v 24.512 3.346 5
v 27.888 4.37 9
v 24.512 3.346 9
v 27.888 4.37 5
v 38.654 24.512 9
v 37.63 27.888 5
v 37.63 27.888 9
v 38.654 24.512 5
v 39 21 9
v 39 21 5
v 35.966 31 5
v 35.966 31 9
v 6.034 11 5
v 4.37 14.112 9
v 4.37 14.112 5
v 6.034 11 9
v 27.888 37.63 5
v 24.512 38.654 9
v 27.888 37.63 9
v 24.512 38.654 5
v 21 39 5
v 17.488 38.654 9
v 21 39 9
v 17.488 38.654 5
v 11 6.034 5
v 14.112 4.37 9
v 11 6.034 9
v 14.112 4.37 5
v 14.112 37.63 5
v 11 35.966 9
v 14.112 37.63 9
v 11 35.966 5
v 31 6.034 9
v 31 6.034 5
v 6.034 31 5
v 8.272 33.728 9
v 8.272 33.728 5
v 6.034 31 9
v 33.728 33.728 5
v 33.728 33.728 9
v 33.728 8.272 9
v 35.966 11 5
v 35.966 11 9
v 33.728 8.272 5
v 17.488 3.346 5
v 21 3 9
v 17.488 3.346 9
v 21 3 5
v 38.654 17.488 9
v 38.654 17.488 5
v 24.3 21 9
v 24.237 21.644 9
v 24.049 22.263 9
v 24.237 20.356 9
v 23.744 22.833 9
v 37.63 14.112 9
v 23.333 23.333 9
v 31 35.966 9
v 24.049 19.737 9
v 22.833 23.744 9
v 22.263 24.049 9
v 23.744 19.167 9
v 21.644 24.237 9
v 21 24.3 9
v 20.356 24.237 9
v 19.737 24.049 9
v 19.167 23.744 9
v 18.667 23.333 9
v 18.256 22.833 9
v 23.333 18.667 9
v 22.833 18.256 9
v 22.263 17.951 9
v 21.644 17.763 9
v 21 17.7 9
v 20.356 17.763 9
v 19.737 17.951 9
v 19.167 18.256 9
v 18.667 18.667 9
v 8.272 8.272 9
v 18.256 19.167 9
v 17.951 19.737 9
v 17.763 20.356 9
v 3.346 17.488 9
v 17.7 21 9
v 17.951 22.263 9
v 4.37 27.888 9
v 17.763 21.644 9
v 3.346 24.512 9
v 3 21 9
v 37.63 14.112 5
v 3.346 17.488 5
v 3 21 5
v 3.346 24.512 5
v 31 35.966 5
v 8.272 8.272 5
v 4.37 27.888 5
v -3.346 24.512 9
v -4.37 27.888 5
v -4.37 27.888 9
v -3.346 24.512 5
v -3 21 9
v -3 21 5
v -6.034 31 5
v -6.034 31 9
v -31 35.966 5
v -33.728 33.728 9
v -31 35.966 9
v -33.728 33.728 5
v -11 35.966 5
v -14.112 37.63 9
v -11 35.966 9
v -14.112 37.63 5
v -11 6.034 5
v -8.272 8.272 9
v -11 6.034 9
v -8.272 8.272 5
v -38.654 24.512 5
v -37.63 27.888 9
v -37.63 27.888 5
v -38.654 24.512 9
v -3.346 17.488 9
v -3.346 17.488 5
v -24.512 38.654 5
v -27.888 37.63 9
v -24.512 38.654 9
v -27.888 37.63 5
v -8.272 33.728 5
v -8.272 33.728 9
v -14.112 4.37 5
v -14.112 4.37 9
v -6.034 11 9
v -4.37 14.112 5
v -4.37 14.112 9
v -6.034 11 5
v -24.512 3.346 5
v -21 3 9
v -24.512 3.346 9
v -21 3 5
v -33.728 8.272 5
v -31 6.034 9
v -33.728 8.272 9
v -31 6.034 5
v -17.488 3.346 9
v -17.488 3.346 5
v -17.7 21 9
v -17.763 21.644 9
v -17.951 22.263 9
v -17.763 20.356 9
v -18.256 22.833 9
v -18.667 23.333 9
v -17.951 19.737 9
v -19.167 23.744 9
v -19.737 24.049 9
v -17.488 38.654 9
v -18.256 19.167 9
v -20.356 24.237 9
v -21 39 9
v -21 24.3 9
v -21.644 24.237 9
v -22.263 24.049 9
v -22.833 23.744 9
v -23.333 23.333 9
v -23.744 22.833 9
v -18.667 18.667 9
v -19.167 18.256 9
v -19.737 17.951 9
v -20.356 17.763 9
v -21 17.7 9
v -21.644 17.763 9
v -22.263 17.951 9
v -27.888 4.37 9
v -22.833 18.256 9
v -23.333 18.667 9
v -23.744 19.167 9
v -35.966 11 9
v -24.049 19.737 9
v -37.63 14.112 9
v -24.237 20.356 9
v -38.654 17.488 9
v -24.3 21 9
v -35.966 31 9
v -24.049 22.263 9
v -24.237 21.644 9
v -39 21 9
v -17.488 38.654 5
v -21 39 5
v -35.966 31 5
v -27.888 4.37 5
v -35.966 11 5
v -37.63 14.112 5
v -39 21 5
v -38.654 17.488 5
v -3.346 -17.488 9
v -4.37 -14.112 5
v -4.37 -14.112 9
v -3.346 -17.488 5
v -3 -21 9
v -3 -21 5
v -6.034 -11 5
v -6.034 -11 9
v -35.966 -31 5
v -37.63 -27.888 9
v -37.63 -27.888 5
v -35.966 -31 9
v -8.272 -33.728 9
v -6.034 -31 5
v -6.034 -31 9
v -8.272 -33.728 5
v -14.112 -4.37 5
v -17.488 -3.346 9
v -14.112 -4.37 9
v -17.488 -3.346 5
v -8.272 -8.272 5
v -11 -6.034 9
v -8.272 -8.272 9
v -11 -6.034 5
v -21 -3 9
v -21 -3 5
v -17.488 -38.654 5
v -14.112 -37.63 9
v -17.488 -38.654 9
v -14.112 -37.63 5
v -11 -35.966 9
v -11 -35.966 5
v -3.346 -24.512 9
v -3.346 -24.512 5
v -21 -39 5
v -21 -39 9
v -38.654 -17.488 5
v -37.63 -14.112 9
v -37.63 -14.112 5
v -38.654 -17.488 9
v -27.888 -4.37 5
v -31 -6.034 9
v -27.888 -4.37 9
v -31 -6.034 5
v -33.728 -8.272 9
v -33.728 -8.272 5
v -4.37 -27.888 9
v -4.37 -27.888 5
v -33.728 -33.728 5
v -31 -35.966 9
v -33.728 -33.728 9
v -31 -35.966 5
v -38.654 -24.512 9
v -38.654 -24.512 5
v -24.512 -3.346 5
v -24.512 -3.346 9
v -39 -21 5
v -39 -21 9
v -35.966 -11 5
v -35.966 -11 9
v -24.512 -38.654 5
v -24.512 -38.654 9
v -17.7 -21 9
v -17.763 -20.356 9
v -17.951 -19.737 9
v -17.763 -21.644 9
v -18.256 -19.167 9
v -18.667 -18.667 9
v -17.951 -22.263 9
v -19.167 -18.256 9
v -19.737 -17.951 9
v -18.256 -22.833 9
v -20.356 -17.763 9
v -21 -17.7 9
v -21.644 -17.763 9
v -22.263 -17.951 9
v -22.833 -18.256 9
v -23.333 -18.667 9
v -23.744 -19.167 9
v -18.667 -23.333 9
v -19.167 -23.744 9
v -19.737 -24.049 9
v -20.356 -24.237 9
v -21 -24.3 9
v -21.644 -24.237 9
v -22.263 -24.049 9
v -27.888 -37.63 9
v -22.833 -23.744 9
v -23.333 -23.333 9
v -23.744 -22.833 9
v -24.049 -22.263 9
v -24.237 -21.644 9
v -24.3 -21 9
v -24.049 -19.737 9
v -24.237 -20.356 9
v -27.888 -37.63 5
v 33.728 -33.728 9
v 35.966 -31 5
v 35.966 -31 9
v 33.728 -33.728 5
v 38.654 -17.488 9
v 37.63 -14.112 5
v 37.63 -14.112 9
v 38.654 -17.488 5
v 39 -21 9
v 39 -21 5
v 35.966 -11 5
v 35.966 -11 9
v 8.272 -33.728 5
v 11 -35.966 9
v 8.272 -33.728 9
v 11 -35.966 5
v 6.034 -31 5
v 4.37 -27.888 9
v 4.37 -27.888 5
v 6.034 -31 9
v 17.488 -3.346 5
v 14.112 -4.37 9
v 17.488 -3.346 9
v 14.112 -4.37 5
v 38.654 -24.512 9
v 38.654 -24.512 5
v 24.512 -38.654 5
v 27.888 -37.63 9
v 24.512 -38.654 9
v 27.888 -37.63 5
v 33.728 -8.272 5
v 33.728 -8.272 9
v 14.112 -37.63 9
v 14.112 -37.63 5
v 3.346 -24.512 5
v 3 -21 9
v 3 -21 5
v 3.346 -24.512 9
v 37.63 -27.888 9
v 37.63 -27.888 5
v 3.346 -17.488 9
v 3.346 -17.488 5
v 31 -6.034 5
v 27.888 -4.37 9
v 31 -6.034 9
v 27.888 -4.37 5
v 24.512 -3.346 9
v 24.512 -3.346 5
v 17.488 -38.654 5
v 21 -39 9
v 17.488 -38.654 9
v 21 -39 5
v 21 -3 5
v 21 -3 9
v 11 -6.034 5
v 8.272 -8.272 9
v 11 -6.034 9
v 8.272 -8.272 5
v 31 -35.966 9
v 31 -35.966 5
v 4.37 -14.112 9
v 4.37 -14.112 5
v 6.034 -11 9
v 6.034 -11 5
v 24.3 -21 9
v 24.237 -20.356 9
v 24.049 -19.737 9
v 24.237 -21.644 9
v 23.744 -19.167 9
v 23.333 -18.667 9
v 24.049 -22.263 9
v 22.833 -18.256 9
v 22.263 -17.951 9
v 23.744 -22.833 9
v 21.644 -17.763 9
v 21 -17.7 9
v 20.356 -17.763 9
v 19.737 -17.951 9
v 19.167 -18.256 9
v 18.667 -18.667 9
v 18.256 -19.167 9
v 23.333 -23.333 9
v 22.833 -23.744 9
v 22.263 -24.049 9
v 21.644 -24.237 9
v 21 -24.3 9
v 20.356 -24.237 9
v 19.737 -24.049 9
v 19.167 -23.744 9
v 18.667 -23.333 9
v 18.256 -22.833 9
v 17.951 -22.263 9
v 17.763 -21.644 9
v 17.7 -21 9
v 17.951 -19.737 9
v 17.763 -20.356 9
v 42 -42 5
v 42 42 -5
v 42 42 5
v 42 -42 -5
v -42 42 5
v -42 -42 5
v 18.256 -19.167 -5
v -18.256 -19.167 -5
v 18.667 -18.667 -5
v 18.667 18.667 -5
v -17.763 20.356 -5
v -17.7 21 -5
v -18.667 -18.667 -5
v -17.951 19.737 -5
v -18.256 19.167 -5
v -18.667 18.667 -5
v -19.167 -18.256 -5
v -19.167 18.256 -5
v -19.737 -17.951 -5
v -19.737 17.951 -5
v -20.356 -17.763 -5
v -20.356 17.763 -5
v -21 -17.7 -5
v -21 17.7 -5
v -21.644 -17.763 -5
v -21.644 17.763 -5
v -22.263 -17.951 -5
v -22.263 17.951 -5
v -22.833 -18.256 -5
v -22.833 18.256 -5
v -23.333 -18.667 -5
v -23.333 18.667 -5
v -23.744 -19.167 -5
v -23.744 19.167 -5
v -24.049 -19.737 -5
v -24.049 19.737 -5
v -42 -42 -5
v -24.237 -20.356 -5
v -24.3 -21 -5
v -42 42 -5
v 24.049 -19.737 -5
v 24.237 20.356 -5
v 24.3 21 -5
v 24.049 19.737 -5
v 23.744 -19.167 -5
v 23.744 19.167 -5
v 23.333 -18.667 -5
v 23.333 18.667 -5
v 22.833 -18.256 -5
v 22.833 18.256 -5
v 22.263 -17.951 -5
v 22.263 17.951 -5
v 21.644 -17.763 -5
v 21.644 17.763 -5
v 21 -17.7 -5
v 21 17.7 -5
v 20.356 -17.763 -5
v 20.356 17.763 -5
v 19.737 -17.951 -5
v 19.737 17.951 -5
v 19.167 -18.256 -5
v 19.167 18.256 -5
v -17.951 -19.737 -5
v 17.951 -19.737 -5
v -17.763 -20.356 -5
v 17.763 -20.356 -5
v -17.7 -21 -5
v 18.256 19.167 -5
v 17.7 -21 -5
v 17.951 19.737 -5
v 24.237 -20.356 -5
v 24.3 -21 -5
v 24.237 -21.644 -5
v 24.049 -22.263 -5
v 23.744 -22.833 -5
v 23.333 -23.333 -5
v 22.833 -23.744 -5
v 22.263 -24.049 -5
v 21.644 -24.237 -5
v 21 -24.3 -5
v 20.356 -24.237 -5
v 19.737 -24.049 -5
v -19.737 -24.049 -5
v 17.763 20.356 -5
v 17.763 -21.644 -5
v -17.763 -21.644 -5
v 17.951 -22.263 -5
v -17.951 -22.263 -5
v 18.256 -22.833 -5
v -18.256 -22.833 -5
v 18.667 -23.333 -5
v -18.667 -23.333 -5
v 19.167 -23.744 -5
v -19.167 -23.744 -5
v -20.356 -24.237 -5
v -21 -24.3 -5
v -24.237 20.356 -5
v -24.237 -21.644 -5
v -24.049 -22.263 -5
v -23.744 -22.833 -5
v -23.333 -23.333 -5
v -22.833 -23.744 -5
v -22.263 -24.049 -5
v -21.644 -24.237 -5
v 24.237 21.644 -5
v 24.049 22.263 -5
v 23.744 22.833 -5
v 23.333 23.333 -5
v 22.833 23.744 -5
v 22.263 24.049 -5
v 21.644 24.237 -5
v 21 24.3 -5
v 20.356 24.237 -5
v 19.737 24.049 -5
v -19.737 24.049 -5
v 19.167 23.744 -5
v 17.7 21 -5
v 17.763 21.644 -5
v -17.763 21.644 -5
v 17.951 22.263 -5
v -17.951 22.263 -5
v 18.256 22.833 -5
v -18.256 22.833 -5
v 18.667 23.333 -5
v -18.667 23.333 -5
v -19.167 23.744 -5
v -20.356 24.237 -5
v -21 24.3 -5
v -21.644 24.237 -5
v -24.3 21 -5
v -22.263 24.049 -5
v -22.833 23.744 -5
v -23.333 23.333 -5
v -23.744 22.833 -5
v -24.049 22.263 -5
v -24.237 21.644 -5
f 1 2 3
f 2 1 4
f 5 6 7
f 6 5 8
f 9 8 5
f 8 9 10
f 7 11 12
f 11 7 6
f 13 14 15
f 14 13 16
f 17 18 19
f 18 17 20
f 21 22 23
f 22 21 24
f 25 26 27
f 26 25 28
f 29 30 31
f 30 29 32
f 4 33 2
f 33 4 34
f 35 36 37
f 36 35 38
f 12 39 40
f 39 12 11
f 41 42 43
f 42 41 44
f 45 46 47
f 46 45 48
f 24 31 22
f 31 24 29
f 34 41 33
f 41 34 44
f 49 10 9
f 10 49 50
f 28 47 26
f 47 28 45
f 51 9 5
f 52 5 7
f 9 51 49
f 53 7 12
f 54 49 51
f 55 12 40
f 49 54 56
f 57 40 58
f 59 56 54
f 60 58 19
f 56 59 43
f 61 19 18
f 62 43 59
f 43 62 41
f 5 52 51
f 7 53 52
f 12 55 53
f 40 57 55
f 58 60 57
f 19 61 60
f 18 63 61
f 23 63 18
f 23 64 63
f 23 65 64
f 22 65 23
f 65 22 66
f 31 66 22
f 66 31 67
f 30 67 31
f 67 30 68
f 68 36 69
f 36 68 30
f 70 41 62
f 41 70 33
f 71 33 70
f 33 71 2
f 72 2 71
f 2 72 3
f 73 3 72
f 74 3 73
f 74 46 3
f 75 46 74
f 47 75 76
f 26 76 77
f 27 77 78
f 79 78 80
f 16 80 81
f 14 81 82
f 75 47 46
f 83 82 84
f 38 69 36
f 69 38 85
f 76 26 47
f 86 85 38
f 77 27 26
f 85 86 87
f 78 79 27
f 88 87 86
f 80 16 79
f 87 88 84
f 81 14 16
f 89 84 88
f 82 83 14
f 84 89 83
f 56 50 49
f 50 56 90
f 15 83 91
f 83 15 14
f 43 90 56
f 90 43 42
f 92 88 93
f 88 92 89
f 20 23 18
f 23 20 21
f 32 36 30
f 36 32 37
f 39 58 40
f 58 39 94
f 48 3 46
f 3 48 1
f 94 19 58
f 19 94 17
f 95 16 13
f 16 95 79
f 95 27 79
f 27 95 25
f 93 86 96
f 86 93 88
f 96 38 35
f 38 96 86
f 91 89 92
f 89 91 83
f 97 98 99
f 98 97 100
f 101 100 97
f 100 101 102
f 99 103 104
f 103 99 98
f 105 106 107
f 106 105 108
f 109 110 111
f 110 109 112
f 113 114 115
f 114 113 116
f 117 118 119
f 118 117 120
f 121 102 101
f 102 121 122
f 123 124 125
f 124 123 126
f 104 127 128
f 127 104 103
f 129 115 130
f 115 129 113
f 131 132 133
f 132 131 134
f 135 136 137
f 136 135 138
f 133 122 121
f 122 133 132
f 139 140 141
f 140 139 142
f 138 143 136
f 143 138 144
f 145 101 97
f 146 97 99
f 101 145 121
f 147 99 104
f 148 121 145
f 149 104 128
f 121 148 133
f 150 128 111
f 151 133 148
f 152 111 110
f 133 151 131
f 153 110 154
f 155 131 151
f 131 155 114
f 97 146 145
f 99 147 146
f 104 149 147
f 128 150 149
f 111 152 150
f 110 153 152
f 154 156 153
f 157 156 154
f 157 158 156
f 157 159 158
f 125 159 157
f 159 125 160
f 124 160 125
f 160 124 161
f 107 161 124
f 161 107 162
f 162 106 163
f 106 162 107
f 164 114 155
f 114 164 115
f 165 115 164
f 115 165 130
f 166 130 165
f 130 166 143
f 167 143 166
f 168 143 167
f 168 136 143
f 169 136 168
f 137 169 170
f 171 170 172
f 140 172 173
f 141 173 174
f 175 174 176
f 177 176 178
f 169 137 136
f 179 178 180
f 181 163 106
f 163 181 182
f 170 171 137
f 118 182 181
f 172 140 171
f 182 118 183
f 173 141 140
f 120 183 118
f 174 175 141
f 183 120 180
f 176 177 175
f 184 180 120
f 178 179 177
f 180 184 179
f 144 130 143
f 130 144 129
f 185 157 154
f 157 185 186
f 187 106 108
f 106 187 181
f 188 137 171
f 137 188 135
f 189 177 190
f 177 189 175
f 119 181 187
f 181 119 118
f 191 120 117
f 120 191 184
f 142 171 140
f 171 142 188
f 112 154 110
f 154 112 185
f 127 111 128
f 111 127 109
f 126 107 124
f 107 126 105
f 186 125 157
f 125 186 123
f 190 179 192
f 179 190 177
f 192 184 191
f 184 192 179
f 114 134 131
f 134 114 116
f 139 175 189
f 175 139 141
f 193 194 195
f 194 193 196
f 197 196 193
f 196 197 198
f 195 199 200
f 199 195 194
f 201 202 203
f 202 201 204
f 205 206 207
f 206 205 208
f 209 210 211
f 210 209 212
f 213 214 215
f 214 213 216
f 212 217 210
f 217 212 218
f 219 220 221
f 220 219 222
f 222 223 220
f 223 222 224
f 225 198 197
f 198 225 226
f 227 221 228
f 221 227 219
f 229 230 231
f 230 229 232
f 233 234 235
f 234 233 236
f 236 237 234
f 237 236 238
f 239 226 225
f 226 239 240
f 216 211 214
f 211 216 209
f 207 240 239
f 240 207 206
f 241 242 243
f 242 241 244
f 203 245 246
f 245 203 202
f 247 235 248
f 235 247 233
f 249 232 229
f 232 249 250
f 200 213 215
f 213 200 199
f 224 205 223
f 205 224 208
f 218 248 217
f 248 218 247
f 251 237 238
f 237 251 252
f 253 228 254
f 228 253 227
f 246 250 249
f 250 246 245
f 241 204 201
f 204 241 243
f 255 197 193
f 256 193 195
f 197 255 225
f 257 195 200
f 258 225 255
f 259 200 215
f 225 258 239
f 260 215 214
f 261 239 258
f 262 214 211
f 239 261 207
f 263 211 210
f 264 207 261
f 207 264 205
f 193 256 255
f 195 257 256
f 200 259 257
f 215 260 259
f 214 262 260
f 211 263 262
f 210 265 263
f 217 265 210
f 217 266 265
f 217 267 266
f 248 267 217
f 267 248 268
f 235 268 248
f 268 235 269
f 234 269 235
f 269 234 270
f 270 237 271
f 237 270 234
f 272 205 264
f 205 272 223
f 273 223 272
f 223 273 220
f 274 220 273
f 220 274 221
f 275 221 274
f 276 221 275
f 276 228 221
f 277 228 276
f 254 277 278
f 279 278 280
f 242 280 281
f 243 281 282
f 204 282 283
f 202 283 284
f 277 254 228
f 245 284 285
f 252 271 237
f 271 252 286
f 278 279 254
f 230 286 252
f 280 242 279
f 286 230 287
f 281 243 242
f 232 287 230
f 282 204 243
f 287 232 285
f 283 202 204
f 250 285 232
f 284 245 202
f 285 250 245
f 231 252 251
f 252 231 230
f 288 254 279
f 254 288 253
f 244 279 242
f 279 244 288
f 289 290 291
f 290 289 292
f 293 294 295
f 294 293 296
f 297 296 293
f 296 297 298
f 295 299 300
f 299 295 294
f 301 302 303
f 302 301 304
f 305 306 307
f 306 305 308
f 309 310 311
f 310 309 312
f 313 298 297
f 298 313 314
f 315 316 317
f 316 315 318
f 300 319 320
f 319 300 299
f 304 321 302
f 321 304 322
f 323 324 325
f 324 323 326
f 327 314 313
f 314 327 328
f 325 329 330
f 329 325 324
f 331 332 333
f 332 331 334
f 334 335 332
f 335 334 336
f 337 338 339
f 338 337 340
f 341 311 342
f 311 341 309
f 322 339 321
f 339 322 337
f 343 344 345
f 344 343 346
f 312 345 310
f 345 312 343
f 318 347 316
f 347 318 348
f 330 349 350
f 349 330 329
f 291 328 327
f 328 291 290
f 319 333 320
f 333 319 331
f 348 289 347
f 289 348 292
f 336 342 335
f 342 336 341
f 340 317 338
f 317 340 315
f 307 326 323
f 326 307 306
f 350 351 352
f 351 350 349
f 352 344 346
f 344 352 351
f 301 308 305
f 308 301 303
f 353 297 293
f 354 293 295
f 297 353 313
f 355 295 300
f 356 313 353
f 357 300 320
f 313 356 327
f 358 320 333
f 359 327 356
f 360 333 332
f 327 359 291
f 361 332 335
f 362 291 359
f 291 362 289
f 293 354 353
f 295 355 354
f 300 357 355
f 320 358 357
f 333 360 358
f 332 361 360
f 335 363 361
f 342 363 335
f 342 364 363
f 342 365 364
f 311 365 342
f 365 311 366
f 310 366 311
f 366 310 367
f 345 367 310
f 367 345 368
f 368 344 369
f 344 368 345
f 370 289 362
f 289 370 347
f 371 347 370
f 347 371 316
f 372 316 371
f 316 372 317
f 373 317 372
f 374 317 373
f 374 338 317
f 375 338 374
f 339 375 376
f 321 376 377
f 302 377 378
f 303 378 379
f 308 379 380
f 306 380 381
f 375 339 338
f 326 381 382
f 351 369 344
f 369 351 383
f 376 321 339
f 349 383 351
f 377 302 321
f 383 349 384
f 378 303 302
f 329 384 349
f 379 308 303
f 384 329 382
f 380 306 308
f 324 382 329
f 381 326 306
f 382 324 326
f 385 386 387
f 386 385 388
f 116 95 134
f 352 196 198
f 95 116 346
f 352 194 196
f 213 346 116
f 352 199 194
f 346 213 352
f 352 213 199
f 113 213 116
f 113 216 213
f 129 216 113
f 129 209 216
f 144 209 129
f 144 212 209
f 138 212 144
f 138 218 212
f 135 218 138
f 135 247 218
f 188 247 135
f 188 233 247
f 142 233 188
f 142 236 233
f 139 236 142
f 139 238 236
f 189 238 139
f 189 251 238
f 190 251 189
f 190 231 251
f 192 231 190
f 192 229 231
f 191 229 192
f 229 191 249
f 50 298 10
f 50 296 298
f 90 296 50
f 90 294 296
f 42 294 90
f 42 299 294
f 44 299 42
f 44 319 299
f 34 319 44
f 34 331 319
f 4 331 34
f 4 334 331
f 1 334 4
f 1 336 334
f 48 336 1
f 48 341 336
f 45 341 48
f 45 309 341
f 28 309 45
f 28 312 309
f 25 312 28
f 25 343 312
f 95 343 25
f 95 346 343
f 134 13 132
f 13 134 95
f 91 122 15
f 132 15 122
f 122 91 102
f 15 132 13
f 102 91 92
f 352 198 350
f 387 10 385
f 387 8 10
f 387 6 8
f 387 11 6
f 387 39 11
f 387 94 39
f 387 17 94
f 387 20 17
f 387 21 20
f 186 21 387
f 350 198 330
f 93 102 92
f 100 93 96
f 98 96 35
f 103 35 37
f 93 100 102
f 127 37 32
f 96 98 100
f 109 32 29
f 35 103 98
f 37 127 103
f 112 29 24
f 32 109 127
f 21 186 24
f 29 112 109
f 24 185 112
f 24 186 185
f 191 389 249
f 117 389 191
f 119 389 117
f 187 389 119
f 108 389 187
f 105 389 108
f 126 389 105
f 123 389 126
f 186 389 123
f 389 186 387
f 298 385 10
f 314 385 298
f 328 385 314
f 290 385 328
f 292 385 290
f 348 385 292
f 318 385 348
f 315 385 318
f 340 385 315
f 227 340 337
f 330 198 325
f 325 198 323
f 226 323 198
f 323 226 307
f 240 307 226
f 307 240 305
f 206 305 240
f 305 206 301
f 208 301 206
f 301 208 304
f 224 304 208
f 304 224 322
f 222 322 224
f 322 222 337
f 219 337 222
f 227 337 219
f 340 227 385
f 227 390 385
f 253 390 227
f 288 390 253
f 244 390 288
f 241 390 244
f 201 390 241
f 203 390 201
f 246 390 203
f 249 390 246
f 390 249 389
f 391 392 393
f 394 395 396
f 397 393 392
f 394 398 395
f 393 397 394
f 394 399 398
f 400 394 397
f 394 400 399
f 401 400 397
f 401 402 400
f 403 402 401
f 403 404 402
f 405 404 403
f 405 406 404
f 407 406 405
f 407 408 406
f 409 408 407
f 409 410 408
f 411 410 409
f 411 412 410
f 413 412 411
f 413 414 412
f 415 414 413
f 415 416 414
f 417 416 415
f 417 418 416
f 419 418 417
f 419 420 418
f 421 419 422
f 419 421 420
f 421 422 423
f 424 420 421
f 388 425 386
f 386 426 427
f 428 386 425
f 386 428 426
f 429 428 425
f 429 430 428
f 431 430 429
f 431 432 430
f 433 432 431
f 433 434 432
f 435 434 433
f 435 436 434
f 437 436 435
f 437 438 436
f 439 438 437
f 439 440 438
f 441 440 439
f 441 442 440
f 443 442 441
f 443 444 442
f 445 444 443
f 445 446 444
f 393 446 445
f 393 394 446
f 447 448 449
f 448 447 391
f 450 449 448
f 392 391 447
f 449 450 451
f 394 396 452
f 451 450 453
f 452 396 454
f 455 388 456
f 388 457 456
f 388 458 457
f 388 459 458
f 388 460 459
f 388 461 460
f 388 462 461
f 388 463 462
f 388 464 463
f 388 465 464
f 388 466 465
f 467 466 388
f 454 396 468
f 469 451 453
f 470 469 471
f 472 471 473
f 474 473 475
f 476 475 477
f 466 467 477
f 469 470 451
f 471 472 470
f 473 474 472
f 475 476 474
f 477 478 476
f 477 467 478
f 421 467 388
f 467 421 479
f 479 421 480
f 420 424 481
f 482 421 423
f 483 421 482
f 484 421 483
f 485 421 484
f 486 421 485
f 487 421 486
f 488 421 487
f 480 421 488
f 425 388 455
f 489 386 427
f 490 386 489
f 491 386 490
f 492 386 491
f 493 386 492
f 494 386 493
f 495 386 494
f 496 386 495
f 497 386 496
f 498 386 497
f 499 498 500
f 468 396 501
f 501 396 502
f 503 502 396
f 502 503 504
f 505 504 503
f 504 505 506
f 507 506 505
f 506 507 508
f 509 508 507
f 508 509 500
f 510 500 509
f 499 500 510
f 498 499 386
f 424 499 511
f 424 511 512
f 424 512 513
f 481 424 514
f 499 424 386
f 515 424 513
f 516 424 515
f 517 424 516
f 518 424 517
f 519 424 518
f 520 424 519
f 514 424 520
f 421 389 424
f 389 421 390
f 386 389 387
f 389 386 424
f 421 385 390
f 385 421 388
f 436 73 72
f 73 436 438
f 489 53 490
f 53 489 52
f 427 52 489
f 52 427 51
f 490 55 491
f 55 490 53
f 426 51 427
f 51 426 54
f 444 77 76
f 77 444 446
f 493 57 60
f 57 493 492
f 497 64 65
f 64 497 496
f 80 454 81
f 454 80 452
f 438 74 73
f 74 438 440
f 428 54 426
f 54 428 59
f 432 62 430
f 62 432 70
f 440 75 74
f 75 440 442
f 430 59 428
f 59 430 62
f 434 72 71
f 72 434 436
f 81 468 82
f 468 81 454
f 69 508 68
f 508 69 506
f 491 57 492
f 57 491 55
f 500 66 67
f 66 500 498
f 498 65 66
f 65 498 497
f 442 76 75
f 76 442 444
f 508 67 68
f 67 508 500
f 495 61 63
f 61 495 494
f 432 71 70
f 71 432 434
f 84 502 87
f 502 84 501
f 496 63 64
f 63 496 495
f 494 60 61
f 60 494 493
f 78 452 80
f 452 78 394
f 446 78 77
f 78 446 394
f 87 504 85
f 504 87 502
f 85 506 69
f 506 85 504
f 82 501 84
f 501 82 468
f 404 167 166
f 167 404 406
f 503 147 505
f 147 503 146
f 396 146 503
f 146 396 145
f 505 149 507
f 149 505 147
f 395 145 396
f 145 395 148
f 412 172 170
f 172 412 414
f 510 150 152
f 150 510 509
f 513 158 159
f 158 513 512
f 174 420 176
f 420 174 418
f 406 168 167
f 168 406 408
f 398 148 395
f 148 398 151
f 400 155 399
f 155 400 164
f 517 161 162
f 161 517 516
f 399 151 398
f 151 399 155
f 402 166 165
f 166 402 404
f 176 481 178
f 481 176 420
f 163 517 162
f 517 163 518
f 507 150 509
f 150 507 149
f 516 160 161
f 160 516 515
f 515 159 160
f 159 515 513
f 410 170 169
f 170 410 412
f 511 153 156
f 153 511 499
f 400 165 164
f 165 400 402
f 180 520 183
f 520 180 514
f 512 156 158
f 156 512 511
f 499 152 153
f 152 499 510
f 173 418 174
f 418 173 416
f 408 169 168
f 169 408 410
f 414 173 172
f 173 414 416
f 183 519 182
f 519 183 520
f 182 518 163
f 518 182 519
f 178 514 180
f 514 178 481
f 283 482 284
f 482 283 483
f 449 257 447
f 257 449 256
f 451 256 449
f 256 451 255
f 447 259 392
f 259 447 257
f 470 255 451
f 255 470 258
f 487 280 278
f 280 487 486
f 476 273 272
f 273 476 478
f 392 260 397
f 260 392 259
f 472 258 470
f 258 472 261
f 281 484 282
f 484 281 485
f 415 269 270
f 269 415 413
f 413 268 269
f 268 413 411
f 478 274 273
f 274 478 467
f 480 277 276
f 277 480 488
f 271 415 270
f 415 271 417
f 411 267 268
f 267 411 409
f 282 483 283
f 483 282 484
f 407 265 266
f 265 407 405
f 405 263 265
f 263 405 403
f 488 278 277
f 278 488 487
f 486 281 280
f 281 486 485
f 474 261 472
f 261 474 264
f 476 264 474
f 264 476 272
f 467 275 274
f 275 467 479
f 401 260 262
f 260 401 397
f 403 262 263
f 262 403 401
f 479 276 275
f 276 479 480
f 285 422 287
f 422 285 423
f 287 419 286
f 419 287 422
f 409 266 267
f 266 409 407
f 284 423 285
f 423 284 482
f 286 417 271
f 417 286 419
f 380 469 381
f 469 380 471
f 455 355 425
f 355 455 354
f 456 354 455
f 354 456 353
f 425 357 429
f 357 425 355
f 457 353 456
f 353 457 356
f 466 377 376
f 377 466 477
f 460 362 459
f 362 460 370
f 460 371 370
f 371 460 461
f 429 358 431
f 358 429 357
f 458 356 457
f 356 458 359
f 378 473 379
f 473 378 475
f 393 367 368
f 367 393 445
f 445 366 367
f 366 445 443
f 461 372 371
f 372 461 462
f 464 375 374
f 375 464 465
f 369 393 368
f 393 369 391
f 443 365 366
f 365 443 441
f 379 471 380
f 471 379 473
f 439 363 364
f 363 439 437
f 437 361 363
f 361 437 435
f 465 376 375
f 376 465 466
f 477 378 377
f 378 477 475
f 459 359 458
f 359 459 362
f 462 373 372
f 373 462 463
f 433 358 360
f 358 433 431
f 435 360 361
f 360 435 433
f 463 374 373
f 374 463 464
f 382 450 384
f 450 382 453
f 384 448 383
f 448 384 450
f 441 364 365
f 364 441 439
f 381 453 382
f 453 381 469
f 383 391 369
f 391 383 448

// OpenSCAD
$fn = 32;

// ----------------------------------------------------------------------
// Anchor pads 84 x 84 x 14
// four corner bosses with anchor holes
// ----------------------------------------------------------------------

// --- parameters (mm) ---
plate = [84, 84, 10];  // base plate size (x, y, z)
pads = 4;              // boss count, one per corner
edge = 21;             // boss centre offset from the plate edge
boss_d = 36;           // boss diameter
boss_h = 4;            // boss height above the base plate
hole_d = 6.6;          // hole diameter

// --- derived feature positions (mm) ---
height = plate[2] + boss_h;      // = 14   overall height of the part
corner_x = plate[0] / 2 - edge;  // = 21   boss centre X
corner_y = plate[1] / 2 - edge;  // = 21   boss centre Y
feature_centers = [
  [corner_x, corner_y],
  [-corner_x, corner_y],
  [-corner_x, -corner_y],
  [corner_x, -corner_y]
];   // boss centres, anchor holes are drilled there

// base plate, four bosses standing on it, anchor holes all the way through
difference() {
  union() {
    cube(plate, center = true);
    for (centre = feature_centers)
      translate([centre[0], centre[1], plate[2] / 2 - 1])
        cylinder(d = boss_d, h = boss_h + 1);
  }
  for (centre = feature_centers)
    translate([centre[0], centre[1], -height])
      cylinder(d = hole_d, h = 2 * height + 2);  // through boss and plate
}
